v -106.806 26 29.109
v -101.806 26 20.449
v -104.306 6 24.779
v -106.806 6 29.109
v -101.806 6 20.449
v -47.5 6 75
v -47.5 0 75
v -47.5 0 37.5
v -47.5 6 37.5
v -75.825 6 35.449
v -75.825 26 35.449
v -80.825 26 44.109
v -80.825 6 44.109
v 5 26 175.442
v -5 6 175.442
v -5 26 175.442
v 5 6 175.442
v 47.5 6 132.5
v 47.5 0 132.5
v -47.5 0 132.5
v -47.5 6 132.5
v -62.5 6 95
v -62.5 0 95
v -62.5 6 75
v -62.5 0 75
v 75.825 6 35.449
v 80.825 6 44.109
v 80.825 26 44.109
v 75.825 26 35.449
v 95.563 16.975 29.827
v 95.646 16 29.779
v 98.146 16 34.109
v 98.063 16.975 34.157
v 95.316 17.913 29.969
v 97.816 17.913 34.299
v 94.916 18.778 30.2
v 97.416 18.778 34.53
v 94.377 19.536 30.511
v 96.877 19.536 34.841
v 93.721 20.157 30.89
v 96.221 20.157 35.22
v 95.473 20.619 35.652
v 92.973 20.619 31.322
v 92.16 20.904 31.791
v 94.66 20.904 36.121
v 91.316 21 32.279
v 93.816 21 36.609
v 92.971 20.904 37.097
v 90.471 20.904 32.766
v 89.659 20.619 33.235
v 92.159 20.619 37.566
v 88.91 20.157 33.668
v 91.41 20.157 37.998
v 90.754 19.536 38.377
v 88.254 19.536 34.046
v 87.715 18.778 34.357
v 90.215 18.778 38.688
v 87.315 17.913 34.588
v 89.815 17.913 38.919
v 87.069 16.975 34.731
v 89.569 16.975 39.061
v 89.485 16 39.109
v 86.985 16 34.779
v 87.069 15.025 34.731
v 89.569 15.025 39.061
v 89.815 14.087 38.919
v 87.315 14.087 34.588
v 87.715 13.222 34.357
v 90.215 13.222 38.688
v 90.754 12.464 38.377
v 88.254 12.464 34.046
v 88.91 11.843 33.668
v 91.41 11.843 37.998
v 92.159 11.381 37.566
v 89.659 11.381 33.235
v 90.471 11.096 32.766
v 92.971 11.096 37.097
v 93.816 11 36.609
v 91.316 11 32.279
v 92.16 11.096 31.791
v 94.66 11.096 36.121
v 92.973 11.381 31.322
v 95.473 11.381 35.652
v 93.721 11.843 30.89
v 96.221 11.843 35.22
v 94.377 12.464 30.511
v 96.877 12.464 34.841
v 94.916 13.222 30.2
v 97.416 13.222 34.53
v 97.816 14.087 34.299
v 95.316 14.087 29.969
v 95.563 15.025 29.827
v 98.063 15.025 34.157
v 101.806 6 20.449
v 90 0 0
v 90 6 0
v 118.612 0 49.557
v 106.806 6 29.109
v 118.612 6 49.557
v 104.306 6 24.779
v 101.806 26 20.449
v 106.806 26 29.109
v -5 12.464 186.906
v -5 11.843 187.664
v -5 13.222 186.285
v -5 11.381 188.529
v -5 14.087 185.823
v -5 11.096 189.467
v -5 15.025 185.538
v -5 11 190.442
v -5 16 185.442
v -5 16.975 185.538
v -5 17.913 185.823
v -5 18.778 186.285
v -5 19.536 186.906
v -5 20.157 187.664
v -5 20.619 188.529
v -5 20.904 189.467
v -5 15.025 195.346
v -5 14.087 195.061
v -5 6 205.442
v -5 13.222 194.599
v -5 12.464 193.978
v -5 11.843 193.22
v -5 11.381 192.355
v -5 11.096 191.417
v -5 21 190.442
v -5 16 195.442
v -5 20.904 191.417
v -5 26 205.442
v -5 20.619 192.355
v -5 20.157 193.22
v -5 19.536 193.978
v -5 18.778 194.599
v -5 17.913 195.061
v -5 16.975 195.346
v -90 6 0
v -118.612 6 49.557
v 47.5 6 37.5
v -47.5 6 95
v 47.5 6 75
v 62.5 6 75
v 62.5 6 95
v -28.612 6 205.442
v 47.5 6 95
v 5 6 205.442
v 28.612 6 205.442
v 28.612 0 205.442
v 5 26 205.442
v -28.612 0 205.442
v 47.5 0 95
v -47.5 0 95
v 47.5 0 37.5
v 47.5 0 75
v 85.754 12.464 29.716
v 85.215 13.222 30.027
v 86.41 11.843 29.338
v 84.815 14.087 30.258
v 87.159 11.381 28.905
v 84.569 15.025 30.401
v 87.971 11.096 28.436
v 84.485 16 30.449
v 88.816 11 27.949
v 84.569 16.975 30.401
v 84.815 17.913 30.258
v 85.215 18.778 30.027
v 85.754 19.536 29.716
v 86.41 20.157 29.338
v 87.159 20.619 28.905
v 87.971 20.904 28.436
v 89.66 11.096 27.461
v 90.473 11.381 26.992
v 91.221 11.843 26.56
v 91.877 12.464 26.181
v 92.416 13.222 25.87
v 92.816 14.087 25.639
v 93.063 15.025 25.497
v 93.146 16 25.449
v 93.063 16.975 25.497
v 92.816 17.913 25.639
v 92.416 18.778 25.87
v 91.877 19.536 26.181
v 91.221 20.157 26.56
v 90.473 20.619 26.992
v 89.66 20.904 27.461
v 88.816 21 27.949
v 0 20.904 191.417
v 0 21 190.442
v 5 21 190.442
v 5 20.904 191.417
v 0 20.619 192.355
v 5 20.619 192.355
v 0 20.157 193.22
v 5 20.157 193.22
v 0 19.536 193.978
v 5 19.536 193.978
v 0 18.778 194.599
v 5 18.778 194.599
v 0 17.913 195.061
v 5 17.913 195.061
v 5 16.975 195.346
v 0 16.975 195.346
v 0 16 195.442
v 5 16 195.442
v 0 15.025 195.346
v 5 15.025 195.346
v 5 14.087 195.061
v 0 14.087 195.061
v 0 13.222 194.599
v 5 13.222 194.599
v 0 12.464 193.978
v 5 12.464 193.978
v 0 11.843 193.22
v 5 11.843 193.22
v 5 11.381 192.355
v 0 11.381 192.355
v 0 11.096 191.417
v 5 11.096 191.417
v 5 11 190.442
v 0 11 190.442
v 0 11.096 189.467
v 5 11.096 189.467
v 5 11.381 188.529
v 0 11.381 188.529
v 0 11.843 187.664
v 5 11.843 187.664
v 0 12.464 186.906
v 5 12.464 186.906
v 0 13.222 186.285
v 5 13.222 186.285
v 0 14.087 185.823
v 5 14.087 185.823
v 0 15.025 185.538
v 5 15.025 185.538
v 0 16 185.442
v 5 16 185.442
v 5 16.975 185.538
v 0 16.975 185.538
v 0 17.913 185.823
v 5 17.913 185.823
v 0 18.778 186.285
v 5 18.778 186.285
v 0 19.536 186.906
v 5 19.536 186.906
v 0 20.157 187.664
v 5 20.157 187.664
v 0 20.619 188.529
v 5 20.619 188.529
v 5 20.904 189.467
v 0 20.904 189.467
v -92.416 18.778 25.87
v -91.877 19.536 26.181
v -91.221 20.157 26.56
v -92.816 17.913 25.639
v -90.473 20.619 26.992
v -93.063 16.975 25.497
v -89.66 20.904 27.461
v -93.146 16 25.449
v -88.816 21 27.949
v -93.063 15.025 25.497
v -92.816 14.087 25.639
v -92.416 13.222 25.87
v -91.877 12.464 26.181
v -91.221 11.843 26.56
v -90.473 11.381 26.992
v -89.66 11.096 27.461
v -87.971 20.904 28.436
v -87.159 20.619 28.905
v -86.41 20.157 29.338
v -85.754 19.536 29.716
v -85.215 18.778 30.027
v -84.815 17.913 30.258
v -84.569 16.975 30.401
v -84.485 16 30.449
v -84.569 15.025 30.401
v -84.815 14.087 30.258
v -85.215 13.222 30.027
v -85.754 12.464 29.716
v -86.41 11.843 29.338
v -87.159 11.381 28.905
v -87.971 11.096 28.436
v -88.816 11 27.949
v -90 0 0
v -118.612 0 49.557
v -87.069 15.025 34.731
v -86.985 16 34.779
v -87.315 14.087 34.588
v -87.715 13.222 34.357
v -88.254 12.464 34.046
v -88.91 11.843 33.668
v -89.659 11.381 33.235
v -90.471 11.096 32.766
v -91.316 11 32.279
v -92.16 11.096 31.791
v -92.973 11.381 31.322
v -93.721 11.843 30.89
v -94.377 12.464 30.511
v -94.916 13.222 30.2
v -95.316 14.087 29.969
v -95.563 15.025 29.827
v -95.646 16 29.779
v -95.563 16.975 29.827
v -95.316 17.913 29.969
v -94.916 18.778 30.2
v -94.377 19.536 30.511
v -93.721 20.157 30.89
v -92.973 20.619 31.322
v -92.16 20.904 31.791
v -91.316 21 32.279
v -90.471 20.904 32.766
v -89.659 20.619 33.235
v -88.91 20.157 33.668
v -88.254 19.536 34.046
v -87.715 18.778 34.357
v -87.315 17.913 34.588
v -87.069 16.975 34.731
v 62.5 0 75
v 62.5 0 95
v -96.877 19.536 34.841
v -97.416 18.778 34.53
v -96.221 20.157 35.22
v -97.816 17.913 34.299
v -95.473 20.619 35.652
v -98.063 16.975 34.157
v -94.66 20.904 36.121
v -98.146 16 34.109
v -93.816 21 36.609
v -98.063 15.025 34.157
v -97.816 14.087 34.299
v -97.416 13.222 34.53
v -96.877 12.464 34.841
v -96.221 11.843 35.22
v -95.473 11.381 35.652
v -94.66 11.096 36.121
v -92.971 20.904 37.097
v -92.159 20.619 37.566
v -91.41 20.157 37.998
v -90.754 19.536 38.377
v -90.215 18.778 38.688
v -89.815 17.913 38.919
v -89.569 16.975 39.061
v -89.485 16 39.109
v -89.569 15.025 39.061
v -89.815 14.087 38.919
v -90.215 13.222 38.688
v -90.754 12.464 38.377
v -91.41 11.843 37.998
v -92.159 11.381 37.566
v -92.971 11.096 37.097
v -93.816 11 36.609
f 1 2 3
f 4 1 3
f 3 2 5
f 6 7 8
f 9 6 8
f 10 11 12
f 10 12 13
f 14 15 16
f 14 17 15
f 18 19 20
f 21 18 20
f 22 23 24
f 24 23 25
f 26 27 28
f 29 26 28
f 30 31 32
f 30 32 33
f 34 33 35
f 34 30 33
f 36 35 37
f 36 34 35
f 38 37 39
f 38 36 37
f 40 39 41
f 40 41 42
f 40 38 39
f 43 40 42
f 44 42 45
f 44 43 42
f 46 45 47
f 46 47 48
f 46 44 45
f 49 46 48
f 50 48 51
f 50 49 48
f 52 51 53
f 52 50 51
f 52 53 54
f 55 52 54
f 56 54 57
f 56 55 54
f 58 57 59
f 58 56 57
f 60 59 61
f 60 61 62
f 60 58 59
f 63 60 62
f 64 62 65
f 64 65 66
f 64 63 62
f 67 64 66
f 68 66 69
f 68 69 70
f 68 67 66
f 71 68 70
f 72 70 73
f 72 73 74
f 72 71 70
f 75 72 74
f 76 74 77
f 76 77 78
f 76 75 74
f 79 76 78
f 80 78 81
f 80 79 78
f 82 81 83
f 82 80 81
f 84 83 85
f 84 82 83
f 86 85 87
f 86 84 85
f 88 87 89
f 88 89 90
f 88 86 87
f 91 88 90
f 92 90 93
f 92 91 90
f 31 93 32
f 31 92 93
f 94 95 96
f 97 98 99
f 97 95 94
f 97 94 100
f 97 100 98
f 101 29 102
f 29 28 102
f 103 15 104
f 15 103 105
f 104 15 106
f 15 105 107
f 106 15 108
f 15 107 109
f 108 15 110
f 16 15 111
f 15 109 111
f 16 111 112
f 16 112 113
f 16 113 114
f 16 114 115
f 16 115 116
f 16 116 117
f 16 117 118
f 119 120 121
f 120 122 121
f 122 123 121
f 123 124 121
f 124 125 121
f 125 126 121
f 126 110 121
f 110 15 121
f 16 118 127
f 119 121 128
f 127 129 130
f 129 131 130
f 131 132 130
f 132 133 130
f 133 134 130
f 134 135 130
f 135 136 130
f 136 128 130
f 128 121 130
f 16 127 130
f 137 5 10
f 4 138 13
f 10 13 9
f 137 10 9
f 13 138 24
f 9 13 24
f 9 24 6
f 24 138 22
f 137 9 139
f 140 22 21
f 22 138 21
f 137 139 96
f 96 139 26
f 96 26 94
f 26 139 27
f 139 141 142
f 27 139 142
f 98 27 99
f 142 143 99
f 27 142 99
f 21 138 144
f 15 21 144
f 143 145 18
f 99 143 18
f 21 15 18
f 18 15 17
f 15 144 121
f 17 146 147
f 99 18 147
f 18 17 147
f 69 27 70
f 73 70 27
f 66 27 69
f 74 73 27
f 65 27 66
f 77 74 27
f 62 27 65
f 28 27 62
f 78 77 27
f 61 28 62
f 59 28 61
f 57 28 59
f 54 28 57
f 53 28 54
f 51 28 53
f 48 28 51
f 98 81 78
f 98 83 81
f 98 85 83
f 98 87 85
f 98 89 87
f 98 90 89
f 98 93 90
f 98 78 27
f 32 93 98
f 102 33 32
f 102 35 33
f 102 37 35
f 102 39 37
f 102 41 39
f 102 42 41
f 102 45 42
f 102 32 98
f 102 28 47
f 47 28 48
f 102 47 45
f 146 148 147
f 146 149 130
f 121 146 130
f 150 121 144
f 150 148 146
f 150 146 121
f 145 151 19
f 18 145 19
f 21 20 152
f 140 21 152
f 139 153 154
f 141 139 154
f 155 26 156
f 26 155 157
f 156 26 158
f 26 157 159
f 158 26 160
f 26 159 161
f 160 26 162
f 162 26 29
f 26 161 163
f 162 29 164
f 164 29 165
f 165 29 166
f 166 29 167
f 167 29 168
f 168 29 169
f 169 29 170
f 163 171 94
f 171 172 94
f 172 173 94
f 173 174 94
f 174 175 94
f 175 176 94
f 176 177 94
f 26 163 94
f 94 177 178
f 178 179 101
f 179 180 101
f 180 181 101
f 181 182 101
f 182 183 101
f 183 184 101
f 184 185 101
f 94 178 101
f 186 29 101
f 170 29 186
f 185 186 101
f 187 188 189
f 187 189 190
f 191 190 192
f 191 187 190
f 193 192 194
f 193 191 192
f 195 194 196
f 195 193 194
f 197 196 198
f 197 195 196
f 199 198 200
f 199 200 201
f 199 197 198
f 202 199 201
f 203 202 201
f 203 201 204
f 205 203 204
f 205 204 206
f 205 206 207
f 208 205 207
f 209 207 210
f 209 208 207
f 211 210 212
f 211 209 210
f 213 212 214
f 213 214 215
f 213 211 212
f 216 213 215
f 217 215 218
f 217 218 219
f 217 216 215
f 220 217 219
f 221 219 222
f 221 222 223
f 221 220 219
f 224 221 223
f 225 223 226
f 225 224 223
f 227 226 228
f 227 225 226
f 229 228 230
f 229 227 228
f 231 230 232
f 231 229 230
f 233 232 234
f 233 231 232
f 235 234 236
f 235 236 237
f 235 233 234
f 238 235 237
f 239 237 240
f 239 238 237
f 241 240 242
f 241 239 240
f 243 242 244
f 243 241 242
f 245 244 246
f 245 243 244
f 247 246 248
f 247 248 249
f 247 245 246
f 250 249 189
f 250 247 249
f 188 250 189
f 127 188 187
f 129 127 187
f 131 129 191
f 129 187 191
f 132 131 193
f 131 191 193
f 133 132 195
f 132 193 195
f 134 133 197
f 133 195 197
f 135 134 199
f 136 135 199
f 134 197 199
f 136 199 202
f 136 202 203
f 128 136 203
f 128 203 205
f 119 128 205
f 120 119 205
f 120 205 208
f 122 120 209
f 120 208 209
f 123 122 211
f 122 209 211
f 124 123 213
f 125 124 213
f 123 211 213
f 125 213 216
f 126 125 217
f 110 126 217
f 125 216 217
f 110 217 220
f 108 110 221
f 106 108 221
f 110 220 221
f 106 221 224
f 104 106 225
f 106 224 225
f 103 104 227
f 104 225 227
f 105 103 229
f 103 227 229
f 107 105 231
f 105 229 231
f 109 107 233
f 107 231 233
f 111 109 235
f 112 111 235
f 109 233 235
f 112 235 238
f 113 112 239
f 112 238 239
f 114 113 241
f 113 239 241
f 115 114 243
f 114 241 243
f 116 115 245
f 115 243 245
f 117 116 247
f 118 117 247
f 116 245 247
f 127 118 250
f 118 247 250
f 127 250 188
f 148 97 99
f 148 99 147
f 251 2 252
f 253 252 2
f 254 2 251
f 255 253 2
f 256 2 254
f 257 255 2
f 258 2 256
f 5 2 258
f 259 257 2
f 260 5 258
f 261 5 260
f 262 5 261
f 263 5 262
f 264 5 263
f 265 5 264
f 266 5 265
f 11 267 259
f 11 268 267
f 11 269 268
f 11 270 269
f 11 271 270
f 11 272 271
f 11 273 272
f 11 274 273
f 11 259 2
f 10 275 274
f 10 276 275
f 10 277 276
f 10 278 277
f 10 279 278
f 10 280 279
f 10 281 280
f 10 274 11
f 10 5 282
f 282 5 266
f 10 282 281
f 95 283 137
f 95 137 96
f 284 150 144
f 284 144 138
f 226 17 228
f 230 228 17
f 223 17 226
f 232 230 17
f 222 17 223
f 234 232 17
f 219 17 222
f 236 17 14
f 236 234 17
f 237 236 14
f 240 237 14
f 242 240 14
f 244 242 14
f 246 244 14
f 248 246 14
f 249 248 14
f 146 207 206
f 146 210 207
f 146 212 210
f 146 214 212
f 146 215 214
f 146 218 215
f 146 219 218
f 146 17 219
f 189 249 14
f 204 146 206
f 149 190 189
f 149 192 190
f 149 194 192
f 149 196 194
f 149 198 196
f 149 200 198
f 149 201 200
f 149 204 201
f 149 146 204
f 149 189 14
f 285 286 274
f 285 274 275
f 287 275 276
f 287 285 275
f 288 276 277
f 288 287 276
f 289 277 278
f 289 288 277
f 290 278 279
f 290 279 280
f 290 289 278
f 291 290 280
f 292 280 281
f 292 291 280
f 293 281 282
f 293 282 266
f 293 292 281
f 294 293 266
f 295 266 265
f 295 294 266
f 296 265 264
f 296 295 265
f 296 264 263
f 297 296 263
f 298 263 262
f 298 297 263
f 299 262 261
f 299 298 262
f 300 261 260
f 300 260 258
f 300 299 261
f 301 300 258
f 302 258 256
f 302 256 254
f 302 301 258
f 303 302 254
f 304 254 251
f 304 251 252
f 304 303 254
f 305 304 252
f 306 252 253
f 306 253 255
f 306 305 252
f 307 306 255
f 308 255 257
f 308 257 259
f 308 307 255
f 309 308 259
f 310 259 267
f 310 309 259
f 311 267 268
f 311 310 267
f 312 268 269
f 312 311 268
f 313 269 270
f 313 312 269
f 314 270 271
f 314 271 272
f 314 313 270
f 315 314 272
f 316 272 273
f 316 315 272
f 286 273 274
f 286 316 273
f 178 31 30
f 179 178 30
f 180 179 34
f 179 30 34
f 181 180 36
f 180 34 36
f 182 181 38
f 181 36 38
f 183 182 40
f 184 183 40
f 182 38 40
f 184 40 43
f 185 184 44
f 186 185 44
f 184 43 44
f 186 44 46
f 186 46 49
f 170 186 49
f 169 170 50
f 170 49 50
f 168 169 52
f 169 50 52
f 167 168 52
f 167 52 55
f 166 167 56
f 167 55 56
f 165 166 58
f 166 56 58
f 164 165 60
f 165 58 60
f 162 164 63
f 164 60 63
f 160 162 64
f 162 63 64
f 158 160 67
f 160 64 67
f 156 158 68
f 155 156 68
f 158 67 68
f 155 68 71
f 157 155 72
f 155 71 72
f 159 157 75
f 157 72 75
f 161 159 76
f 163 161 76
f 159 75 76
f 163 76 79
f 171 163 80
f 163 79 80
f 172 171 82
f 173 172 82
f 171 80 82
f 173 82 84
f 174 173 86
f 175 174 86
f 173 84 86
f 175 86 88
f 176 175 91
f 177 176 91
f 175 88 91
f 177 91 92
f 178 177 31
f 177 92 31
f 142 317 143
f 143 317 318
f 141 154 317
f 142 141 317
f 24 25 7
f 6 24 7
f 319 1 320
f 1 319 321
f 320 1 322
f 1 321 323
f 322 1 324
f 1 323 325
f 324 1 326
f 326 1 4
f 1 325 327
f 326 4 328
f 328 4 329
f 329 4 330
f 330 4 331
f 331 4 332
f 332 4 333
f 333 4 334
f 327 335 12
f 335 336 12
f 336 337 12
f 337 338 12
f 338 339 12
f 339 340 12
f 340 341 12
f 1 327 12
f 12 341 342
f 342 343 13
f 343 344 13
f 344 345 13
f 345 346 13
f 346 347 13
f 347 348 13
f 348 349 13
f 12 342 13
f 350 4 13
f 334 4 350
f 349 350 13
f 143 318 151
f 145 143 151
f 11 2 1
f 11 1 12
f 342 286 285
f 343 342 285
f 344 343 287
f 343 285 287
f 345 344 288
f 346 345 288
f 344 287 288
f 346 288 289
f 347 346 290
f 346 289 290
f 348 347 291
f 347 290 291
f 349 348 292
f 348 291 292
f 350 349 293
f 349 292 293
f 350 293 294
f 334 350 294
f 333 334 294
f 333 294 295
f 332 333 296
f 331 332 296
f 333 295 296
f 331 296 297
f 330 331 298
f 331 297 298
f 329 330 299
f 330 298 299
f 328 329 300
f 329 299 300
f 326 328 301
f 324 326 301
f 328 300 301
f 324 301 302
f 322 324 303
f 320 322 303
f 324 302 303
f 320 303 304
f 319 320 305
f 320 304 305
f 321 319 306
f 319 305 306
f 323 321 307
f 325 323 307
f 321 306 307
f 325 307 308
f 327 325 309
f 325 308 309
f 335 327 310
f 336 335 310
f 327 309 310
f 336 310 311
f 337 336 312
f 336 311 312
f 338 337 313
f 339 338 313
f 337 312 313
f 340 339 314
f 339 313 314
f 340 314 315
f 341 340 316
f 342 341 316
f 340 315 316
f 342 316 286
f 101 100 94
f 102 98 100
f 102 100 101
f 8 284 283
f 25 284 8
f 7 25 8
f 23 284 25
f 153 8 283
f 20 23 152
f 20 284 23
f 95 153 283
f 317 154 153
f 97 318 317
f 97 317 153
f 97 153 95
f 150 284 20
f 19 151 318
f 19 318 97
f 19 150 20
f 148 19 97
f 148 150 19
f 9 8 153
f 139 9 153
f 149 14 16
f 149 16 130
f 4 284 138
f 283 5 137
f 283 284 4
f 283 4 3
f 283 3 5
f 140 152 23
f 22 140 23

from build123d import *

# Parameters (mm, degrees)
F1_DEPTH       = 6
F3_DEPTH       = 25
F4_W           = 20
F4_H           = 30
F4_R           = 5
F5_DEPTH       = 5
F5_DEPTH_BACK  = 5
F10_W          = 30
F10_H          = 20
F10_R          = 5
F11_DEPTH      = 5
F11_DEPTH_BACK = 5
F16_W          = 30
F16_H          = 20
F16_R          = 5
F17_DEPTH      = 5
F17_DEPTH_BACK = 5


with BuildPart() as f1:
    # F0 (on Front) → F1 (new body)
    with BuildSketch(Plane.XZ):
        Polygon((28.612, 205.4420103874), (-28.612, 205.4420103874), (-118.612, 49.5574377062), (-90, 0), (90, 0), (118.612, 49.5574377062), align=None)
    extrude(amount=-F1_DEPTH)

    # F2 (on Front) → F3 (cut)
    with BuildSketch(Plane.XZ):
        Polygon((47.4997490062, 132.5), (-47.5002509938, 132.5), (-47.5002509938, 95), (-62.5002509938, 95), (-62.5002509938, 75), (-47.5002509938, 75), (-47.5002509938, 37.5), (47.4997490062, 37.5), (47.4997490062, 75), (62.4997490062, 75), (62.4997490062, 95), (47.4997490062, 95), align=None)
    extrude(amount=-F3_DEPTH, mode=Mode.SUBTRACT)

    # F4 (on Right) → F5 (join, two sides)
    with BuildSketch(Plane.YZ) as f5_sk:
        with Locations((16, 190.4420103874)):
            Rectangle(F4_W, F4_H)
        with Locations((16, 190.4420103874)):
            Circle(F4_R, mode=Mode.SUBTRACT)
    extrude(amount=F5_DEPTH)
    extrude(f5_sk.sketch, amount=-F5_DEPTH_BACK)

    # F10 (on 3pt) → F11 (join, two sides)
    with BuildSketch(Plane(origin=(36.806, 0, 63.7498620234), x_dir=(0.8660254038, 0, -0.5), z_dir=(0.5, 0, 0.8660254038))) as f11_sk:
        with Locations((62.9422863406, 16)):
            Rectangle(F10_W, F10_H)
        with Locations((62.9422863406, 16)):
            Circle(F10_R, mode=Mode.SUBTRACT)
    extrude(amount=F11_DEPTH)
    extrude(f11_sk.sketch, amount=-F11_DEPTH_BACK)

    # F16 (on 3pt) → F17 (join, two sides)
    with BuildSketch(Plane(origin=(-36.806, 0, 63.7498620234), x_dir=(0.8660254038, 0, 0.5), z_dir=(0.5, 0, -0.8660254038))) as f17_sk:
        with Locations((-62.9422863406, -16)):
            Rectangle(F16_W, F16_H)
        with Locations((-62.9422863406, -16)):
            Circle(F16_R, mode=Mode.SUBTRACT)
    extrude(amount=F17_DEPTH)
    extrude(f17_sk.sketch, amount=-F17_DEPTH_BACK)


solid = f1.part
